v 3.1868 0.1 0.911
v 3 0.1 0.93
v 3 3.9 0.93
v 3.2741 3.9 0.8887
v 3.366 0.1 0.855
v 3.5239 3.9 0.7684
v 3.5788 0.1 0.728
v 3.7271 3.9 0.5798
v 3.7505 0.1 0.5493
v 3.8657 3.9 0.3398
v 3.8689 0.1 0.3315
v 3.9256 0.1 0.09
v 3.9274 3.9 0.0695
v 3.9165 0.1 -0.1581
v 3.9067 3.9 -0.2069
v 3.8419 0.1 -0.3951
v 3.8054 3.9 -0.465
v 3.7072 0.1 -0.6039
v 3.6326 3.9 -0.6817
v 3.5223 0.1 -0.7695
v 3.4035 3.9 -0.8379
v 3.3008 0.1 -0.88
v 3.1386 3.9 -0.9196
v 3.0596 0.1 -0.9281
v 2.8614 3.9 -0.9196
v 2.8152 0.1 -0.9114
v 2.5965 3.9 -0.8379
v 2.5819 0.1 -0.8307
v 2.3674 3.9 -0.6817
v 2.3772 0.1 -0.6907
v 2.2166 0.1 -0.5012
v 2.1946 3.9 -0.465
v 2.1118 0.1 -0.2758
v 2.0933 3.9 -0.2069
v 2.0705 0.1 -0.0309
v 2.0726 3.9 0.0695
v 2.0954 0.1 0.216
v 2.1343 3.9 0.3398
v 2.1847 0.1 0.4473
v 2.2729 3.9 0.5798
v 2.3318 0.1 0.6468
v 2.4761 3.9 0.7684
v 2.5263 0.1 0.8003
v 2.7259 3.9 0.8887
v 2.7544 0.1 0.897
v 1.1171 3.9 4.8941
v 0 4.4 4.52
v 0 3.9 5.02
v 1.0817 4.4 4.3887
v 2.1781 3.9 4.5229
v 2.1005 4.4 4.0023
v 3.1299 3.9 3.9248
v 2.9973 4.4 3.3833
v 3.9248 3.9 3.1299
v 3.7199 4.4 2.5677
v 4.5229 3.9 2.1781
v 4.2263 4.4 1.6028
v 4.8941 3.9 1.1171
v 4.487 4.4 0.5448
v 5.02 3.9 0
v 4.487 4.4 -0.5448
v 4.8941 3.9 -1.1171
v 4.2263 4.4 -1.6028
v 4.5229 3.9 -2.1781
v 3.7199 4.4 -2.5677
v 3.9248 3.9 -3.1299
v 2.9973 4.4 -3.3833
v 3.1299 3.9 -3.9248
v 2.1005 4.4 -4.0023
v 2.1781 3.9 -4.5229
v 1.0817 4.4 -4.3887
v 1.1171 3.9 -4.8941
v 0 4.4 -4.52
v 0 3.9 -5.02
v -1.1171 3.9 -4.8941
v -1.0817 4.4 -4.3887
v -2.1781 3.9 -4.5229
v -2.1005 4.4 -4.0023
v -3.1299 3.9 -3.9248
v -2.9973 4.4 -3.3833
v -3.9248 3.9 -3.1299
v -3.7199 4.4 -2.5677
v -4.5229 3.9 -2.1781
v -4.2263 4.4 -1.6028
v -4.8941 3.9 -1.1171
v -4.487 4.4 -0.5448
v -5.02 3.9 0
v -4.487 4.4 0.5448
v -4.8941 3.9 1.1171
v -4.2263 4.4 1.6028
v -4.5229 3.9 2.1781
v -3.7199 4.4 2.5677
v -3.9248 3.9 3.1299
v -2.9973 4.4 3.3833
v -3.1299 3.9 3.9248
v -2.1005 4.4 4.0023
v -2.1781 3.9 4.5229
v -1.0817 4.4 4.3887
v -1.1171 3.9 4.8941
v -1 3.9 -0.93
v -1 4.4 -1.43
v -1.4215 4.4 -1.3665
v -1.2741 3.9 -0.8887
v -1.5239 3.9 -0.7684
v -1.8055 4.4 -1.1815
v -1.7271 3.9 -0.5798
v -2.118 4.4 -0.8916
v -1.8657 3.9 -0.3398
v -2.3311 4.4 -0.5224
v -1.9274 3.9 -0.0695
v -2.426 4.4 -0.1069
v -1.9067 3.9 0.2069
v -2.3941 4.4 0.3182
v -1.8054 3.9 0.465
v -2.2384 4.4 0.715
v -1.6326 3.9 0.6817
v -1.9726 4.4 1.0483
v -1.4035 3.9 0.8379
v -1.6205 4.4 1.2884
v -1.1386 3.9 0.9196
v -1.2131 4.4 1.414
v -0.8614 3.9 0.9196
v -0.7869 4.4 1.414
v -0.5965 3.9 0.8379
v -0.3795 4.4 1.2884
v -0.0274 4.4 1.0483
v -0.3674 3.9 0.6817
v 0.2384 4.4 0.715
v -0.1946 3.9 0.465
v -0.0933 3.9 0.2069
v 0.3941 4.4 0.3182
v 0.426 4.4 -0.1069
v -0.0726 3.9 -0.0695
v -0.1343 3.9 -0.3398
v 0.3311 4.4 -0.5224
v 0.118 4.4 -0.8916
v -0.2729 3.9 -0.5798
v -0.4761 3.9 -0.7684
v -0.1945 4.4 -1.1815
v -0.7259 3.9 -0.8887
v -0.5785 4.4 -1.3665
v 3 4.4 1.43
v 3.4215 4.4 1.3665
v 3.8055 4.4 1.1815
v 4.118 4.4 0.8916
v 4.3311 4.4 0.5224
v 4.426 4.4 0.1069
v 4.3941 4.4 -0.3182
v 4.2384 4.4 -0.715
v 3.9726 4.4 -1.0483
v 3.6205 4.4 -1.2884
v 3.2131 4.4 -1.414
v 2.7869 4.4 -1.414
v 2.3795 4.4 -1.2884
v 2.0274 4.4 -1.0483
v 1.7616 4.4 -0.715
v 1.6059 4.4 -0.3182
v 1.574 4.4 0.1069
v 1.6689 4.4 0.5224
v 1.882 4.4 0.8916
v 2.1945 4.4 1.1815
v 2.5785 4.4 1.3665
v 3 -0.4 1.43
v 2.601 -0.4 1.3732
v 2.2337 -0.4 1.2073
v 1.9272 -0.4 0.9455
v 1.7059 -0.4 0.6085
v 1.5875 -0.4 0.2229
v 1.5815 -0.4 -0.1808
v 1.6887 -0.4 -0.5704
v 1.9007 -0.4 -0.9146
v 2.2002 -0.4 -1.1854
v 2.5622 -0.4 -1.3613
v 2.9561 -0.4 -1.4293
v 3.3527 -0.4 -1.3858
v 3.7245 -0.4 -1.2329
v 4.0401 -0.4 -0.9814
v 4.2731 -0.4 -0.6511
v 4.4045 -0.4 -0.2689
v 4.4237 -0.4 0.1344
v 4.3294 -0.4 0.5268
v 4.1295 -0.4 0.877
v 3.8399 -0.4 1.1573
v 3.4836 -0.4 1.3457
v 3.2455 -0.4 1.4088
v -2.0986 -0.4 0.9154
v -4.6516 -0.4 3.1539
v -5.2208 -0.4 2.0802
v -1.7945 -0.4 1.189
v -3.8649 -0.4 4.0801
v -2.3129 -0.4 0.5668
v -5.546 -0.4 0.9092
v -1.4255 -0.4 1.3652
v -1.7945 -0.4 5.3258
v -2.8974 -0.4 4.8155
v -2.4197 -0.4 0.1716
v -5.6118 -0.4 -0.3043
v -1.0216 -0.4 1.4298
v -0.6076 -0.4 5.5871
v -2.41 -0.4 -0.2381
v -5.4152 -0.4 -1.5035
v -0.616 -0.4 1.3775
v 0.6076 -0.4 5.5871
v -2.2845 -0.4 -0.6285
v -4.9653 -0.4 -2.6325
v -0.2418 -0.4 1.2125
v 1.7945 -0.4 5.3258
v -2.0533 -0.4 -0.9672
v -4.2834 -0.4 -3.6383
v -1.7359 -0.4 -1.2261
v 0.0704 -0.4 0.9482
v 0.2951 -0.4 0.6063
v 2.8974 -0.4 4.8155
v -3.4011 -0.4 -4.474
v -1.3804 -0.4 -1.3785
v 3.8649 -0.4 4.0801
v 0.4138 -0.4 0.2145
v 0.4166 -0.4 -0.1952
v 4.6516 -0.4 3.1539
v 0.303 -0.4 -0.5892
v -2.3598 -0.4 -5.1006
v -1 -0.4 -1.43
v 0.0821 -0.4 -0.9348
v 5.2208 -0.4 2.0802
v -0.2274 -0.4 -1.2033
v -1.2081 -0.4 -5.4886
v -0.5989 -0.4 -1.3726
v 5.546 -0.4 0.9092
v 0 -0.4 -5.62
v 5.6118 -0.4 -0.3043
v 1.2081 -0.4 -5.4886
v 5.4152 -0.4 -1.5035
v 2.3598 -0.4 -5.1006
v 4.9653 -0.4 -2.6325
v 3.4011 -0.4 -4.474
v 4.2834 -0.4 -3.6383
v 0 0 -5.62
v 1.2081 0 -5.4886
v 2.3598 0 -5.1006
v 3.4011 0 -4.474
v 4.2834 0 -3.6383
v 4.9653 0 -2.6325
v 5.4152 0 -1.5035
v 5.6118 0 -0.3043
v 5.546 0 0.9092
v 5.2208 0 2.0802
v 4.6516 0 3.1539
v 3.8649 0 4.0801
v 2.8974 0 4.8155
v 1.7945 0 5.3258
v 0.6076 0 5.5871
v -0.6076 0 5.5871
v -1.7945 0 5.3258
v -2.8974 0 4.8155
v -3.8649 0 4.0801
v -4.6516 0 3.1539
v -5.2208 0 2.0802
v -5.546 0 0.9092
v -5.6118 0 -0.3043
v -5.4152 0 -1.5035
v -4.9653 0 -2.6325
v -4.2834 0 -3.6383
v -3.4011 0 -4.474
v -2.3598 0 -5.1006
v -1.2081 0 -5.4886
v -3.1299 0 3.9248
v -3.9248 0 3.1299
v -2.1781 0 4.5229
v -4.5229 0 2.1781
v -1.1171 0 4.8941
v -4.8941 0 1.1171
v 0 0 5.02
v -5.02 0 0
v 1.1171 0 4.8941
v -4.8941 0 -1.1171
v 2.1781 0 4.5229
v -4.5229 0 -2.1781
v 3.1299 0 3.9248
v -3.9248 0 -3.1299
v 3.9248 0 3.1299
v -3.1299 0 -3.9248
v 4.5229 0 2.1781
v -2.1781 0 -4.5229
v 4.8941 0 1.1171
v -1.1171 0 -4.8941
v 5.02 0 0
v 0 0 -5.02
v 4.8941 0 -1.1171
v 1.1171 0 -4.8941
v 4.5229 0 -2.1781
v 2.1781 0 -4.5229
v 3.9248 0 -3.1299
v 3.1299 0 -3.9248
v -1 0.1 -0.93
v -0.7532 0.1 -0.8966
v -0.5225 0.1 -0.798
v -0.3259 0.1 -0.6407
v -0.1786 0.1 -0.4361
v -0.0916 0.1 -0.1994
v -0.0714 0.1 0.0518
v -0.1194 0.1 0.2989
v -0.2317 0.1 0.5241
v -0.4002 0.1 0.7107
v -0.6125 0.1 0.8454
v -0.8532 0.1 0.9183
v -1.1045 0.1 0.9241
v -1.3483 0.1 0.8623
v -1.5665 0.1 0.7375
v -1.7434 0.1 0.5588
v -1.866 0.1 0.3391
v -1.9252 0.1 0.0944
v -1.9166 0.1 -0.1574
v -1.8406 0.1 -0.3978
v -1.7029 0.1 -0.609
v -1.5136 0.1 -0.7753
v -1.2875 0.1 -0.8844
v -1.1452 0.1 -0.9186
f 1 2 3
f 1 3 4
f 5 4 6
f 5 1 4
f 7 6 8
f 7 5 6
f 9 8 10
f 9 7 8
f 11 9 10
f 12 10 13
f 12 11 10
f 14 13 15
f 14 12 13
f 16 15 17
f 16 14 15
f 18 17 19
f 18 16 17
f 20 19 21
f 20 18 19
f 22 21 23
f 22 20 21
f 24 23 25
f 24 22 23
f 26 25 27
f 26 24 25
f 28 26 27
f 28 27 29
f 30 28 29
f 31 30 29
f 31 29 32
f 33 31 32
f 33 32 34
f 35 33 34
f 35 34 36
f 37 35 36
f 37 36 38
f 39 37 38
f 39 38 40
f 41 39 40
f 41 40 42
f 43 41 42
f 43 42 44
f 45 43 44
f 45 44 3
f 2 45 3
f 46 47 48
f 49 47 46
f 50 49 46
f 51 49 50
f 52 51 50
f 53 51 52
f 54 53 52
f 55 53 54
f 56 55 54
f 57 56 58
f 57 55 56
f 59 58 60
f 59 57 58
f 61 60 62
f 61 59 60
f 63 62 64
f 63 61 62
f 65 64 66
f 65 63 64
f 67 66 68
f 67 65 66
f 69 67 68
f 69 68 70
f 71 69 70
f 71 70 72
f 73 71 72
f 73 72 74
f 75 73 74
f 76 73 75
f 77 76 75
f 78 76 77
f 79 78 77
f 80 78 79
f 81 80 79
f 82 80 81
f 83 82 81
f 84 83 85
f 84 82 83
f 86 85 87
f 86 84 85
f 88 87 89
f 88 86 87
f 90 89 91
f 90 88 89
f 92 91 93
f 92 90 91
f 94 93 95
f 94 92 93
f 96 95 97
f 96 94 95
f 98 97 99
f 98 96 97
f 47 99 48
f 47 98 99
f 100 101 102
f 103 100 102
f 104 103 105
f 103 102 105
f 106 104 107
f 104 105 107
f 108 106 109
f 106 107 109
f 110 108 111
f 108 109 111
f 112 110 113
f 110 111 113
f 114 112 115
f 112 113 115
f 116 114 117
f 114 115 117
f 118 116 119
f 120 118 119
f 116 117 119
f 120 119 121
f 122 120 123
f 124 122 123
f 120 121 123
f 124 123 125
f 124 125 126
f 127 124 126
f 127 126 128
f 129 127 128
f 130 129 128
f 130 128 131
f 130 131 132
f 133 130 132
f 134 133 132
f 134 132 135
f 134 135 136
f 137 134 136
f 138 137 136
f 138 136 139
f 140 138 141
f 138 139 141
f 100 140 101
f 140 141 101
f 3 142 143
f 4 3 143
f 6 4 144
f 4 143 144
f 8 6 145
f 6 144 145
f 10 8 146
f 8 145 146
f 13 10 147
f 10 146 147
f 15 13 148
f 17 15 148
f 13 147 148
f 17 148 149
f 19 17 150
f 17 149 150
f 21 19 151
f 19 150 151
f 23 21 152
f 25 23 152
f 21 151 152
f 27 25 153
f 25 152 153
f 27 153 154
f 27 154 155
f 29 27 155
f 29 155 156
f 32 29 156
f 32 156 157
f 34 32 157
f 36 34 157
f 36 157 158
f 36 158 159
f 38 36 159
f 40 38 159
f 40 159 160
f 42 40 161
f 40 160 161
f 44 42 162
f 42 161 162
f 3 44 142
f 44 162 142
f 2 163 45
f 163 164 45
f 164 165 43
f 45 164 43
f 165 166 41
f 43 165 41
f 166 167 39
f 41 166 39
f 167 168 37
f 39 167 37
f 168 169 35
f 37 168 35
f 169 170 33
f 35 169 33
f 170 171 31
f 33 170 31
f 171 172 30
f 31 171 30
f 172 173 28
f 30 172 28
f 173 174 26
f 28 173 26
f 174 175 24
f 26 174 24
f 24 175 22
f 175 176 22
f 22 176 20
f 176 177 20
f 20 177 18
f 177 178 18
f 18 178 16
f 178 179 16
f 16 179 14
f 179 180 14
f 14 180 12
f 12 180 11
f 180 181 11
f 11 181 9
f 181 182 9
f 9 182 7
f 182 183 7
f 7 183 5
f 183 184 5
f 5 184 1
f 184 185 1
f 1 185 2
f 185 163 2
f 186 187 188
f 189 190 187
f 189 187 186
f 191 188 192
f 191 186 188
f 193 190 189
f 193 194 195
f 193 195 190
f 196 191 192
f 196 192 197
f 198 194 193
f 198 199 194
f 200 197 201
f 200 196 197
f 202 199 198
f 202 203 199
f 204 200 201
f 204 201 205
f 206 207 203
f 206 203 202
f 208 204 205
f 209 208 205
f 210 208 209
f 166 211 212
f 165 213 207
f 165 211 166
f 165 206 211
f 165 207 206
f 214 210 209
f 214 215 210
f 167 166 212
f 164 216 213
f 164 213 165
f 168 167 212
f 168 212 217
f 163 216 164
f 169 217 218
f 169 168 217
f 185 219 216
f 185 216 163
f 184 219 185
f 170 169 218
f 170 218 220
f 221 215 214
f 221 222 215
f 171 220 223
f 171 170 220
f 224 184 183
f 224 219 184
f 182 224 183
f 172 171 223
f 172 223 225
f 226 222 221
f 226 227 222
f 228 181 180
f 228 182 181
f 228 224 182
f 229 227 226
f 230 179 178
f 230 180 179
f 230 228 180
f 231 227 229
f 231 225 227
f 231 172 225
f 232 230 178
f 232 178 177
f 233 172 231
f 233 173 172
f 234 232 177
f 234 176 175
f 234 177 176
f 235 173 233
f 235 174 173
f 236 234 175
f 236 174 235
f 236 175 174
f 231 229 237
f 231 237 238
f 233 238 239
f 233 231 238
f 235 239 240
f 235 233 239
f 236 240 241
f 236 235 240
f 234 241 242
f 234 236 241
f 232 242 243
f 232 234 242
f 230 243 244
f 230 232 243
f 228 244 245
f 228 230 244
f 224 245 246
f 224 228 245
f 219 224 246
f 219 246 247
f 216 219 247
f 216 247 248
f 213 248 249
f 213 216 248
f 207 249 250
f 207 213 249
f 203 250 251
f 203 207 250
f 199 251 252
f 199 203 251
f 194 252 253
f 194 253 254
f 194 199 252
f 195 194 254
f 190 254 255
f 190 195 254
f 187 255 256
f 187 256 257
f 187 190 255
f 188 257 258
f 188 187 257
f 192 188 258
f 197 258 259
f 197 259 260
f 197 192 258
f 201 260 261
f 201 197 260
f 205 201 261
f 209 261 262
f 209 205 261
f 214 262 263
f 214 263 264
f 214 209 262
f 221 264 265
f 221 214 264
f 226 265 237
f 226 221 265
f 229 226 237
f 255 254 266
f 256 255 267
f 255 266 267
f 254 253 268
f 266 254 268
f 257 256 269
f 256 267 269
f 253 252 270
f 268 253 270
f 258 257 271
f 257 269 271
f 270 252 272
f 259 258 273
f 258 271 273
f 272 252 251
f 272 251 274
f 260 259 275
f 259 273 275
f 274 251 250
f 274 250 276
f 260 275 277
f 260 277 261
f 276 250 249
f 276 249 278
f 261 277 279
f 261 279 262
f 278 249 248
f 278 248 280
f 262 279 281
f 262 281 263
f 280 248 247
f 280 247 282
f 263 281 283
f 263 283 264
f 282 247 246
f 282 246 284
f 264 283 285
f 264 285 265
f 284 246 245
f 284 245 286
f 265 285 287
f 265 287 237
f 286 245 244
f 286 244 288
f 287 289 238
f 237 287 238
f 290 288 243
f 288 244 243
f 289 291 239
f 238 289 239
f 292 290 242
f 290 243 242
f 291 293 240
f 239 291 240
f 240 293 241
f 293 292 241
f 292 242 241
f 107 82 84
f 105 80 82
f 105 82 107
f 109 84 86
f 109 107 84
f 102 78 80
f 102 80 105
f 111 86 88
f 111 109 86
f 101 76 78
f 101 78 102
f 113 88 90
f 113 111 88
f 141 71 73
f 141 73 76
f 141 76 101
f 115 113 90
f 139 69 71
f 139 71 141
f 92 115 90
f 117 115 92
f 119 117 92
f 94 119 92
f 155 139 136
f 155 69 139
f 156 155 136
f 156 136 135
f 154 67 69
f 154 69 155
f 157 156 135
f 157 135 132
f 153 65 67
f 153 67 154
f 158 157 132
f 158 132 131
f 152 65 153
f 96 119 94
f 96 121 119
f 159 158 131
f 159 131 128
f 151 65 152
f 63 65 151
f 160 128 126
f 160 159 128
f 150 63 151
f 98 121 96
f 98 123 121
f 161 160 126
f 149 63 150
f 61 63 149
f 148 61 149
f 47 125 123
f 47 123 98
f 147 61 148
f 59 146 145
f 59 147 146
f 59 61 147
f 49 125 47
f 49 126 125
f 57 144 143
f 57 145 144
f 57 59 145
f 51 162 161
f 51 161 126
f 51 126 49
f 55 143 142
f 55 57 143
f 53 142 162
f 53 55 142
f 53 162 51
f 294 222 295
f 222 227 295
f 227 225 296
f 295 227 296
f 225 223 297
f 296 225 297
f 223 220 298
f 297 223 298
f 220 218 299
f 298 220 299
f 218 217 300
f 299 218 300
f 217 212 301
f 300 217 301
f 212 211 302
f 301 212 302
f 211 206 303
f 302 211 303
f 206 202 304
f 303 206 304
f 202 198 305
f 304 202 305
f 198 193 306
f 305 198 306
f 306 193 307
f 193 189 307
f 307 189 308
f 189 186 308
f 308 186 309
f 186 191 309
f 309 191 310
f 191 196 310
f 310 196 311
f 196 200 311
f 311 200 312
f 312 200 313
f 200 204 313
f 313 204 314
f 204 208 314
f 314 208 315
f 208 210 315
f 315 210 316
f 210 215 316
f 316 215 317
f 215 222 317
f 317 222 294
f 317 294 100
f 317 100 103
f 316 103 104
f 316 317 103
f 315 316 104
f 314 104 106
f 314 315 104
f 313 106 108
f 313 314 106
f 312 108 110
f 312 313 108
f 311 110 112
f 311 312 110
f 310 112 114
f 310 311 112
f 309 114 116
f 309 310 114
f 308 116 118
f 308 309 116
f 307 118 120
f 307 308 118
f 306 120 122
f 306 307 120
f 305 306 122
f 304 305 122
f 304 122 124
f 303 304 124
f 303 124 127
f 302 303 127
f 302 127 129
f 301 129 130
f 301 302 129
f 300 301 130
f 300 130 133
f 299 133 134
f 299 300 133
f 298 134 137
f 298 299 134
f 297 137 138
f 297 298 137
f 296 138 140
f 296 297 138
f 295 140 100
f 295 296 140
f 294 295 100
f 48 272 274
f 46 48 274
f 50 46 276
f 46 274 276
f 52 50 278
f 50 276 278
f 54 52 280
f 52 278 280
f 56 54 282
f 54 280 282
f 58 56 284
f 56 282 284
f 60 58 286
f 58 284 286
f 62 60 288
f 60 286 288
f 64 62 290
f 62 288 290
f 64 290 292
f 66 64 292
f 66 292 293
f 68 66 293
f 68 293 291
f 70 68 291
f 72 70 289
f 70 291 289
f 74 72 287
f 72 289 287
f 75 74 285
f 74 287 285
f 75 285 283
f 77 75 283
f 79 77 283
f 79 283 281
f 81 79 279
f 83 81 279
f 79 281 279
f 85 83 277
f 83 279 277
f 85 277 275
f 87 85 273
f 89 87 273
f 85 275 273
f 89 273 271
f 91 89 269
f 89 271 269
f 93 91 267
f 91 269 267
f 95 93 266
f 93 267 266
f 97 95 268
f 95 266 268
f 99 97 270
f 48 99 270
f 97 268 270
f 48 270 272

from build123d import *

# Parameters (mm, degrees)
SKETCH_1_R      = 5.02
SKETCH_1_R_2    = 0.93
EXTRUDE_1_DEPTH = 4.4
EXTRUDE_START   = 0.4
SKETCH_3_R      = 5.62
SKETCH_3_R_2    = 0.93
EXTRUDE_2_DEPTH = 0.4
CHAMFER_1_SIZE  = 0.5


with BuildPart() as part:
    # 草图1 → 凸台-拉伸1 (new body)
    with BuildSketch(Plane(origin=(0, 0, 0), x_dir=(1, 0, 0), z_dir=(0, 1, 0))):
        Circle(SKETCH_1_R)
        with Locations((3, 0)):
            Circle(SKETCH_1_R_2, mode=Mode.SUBTRACT)
        with Locations((-1, 0)):
            Circle(SKETCH_1_R_2, mode=Mode.SUBTRACT)
    extrude(amount=EXTRUDE_1_DEPTH)

    # 草图3 → 凸台-拉伸2 (add)
    with BuildSketch(Plane.XZ.offset(EXTRUDE_START)):
        Circle(SKETCH_3_R)
        with Locations((3, 0)):
            Circle(SKETCH_3_R_2, mode=Mode.SUBTRACT)
        with Locations((-1, 0)):
            Circle(SKETCH_3_R_2, mode=Mode.SUBTRACT)
    extrude(amount=-EXTRUDE_2_DEPTH)

    # 倒角1
    chamfer_1_edges = [part.edges().sort_by_distance(p)[0] for p in [
        (-5.02, 4.4, 0),
        (-1.93, 4.4, 0),
        (2.07, 4.4, 0),
        (-1.93, -0.4, 0),
        (2.07, -0.4, 0),
    ]]
    chamfer(chamfer_1_edges, length=CHAMFER_1_SIZE)


solid = part.part
